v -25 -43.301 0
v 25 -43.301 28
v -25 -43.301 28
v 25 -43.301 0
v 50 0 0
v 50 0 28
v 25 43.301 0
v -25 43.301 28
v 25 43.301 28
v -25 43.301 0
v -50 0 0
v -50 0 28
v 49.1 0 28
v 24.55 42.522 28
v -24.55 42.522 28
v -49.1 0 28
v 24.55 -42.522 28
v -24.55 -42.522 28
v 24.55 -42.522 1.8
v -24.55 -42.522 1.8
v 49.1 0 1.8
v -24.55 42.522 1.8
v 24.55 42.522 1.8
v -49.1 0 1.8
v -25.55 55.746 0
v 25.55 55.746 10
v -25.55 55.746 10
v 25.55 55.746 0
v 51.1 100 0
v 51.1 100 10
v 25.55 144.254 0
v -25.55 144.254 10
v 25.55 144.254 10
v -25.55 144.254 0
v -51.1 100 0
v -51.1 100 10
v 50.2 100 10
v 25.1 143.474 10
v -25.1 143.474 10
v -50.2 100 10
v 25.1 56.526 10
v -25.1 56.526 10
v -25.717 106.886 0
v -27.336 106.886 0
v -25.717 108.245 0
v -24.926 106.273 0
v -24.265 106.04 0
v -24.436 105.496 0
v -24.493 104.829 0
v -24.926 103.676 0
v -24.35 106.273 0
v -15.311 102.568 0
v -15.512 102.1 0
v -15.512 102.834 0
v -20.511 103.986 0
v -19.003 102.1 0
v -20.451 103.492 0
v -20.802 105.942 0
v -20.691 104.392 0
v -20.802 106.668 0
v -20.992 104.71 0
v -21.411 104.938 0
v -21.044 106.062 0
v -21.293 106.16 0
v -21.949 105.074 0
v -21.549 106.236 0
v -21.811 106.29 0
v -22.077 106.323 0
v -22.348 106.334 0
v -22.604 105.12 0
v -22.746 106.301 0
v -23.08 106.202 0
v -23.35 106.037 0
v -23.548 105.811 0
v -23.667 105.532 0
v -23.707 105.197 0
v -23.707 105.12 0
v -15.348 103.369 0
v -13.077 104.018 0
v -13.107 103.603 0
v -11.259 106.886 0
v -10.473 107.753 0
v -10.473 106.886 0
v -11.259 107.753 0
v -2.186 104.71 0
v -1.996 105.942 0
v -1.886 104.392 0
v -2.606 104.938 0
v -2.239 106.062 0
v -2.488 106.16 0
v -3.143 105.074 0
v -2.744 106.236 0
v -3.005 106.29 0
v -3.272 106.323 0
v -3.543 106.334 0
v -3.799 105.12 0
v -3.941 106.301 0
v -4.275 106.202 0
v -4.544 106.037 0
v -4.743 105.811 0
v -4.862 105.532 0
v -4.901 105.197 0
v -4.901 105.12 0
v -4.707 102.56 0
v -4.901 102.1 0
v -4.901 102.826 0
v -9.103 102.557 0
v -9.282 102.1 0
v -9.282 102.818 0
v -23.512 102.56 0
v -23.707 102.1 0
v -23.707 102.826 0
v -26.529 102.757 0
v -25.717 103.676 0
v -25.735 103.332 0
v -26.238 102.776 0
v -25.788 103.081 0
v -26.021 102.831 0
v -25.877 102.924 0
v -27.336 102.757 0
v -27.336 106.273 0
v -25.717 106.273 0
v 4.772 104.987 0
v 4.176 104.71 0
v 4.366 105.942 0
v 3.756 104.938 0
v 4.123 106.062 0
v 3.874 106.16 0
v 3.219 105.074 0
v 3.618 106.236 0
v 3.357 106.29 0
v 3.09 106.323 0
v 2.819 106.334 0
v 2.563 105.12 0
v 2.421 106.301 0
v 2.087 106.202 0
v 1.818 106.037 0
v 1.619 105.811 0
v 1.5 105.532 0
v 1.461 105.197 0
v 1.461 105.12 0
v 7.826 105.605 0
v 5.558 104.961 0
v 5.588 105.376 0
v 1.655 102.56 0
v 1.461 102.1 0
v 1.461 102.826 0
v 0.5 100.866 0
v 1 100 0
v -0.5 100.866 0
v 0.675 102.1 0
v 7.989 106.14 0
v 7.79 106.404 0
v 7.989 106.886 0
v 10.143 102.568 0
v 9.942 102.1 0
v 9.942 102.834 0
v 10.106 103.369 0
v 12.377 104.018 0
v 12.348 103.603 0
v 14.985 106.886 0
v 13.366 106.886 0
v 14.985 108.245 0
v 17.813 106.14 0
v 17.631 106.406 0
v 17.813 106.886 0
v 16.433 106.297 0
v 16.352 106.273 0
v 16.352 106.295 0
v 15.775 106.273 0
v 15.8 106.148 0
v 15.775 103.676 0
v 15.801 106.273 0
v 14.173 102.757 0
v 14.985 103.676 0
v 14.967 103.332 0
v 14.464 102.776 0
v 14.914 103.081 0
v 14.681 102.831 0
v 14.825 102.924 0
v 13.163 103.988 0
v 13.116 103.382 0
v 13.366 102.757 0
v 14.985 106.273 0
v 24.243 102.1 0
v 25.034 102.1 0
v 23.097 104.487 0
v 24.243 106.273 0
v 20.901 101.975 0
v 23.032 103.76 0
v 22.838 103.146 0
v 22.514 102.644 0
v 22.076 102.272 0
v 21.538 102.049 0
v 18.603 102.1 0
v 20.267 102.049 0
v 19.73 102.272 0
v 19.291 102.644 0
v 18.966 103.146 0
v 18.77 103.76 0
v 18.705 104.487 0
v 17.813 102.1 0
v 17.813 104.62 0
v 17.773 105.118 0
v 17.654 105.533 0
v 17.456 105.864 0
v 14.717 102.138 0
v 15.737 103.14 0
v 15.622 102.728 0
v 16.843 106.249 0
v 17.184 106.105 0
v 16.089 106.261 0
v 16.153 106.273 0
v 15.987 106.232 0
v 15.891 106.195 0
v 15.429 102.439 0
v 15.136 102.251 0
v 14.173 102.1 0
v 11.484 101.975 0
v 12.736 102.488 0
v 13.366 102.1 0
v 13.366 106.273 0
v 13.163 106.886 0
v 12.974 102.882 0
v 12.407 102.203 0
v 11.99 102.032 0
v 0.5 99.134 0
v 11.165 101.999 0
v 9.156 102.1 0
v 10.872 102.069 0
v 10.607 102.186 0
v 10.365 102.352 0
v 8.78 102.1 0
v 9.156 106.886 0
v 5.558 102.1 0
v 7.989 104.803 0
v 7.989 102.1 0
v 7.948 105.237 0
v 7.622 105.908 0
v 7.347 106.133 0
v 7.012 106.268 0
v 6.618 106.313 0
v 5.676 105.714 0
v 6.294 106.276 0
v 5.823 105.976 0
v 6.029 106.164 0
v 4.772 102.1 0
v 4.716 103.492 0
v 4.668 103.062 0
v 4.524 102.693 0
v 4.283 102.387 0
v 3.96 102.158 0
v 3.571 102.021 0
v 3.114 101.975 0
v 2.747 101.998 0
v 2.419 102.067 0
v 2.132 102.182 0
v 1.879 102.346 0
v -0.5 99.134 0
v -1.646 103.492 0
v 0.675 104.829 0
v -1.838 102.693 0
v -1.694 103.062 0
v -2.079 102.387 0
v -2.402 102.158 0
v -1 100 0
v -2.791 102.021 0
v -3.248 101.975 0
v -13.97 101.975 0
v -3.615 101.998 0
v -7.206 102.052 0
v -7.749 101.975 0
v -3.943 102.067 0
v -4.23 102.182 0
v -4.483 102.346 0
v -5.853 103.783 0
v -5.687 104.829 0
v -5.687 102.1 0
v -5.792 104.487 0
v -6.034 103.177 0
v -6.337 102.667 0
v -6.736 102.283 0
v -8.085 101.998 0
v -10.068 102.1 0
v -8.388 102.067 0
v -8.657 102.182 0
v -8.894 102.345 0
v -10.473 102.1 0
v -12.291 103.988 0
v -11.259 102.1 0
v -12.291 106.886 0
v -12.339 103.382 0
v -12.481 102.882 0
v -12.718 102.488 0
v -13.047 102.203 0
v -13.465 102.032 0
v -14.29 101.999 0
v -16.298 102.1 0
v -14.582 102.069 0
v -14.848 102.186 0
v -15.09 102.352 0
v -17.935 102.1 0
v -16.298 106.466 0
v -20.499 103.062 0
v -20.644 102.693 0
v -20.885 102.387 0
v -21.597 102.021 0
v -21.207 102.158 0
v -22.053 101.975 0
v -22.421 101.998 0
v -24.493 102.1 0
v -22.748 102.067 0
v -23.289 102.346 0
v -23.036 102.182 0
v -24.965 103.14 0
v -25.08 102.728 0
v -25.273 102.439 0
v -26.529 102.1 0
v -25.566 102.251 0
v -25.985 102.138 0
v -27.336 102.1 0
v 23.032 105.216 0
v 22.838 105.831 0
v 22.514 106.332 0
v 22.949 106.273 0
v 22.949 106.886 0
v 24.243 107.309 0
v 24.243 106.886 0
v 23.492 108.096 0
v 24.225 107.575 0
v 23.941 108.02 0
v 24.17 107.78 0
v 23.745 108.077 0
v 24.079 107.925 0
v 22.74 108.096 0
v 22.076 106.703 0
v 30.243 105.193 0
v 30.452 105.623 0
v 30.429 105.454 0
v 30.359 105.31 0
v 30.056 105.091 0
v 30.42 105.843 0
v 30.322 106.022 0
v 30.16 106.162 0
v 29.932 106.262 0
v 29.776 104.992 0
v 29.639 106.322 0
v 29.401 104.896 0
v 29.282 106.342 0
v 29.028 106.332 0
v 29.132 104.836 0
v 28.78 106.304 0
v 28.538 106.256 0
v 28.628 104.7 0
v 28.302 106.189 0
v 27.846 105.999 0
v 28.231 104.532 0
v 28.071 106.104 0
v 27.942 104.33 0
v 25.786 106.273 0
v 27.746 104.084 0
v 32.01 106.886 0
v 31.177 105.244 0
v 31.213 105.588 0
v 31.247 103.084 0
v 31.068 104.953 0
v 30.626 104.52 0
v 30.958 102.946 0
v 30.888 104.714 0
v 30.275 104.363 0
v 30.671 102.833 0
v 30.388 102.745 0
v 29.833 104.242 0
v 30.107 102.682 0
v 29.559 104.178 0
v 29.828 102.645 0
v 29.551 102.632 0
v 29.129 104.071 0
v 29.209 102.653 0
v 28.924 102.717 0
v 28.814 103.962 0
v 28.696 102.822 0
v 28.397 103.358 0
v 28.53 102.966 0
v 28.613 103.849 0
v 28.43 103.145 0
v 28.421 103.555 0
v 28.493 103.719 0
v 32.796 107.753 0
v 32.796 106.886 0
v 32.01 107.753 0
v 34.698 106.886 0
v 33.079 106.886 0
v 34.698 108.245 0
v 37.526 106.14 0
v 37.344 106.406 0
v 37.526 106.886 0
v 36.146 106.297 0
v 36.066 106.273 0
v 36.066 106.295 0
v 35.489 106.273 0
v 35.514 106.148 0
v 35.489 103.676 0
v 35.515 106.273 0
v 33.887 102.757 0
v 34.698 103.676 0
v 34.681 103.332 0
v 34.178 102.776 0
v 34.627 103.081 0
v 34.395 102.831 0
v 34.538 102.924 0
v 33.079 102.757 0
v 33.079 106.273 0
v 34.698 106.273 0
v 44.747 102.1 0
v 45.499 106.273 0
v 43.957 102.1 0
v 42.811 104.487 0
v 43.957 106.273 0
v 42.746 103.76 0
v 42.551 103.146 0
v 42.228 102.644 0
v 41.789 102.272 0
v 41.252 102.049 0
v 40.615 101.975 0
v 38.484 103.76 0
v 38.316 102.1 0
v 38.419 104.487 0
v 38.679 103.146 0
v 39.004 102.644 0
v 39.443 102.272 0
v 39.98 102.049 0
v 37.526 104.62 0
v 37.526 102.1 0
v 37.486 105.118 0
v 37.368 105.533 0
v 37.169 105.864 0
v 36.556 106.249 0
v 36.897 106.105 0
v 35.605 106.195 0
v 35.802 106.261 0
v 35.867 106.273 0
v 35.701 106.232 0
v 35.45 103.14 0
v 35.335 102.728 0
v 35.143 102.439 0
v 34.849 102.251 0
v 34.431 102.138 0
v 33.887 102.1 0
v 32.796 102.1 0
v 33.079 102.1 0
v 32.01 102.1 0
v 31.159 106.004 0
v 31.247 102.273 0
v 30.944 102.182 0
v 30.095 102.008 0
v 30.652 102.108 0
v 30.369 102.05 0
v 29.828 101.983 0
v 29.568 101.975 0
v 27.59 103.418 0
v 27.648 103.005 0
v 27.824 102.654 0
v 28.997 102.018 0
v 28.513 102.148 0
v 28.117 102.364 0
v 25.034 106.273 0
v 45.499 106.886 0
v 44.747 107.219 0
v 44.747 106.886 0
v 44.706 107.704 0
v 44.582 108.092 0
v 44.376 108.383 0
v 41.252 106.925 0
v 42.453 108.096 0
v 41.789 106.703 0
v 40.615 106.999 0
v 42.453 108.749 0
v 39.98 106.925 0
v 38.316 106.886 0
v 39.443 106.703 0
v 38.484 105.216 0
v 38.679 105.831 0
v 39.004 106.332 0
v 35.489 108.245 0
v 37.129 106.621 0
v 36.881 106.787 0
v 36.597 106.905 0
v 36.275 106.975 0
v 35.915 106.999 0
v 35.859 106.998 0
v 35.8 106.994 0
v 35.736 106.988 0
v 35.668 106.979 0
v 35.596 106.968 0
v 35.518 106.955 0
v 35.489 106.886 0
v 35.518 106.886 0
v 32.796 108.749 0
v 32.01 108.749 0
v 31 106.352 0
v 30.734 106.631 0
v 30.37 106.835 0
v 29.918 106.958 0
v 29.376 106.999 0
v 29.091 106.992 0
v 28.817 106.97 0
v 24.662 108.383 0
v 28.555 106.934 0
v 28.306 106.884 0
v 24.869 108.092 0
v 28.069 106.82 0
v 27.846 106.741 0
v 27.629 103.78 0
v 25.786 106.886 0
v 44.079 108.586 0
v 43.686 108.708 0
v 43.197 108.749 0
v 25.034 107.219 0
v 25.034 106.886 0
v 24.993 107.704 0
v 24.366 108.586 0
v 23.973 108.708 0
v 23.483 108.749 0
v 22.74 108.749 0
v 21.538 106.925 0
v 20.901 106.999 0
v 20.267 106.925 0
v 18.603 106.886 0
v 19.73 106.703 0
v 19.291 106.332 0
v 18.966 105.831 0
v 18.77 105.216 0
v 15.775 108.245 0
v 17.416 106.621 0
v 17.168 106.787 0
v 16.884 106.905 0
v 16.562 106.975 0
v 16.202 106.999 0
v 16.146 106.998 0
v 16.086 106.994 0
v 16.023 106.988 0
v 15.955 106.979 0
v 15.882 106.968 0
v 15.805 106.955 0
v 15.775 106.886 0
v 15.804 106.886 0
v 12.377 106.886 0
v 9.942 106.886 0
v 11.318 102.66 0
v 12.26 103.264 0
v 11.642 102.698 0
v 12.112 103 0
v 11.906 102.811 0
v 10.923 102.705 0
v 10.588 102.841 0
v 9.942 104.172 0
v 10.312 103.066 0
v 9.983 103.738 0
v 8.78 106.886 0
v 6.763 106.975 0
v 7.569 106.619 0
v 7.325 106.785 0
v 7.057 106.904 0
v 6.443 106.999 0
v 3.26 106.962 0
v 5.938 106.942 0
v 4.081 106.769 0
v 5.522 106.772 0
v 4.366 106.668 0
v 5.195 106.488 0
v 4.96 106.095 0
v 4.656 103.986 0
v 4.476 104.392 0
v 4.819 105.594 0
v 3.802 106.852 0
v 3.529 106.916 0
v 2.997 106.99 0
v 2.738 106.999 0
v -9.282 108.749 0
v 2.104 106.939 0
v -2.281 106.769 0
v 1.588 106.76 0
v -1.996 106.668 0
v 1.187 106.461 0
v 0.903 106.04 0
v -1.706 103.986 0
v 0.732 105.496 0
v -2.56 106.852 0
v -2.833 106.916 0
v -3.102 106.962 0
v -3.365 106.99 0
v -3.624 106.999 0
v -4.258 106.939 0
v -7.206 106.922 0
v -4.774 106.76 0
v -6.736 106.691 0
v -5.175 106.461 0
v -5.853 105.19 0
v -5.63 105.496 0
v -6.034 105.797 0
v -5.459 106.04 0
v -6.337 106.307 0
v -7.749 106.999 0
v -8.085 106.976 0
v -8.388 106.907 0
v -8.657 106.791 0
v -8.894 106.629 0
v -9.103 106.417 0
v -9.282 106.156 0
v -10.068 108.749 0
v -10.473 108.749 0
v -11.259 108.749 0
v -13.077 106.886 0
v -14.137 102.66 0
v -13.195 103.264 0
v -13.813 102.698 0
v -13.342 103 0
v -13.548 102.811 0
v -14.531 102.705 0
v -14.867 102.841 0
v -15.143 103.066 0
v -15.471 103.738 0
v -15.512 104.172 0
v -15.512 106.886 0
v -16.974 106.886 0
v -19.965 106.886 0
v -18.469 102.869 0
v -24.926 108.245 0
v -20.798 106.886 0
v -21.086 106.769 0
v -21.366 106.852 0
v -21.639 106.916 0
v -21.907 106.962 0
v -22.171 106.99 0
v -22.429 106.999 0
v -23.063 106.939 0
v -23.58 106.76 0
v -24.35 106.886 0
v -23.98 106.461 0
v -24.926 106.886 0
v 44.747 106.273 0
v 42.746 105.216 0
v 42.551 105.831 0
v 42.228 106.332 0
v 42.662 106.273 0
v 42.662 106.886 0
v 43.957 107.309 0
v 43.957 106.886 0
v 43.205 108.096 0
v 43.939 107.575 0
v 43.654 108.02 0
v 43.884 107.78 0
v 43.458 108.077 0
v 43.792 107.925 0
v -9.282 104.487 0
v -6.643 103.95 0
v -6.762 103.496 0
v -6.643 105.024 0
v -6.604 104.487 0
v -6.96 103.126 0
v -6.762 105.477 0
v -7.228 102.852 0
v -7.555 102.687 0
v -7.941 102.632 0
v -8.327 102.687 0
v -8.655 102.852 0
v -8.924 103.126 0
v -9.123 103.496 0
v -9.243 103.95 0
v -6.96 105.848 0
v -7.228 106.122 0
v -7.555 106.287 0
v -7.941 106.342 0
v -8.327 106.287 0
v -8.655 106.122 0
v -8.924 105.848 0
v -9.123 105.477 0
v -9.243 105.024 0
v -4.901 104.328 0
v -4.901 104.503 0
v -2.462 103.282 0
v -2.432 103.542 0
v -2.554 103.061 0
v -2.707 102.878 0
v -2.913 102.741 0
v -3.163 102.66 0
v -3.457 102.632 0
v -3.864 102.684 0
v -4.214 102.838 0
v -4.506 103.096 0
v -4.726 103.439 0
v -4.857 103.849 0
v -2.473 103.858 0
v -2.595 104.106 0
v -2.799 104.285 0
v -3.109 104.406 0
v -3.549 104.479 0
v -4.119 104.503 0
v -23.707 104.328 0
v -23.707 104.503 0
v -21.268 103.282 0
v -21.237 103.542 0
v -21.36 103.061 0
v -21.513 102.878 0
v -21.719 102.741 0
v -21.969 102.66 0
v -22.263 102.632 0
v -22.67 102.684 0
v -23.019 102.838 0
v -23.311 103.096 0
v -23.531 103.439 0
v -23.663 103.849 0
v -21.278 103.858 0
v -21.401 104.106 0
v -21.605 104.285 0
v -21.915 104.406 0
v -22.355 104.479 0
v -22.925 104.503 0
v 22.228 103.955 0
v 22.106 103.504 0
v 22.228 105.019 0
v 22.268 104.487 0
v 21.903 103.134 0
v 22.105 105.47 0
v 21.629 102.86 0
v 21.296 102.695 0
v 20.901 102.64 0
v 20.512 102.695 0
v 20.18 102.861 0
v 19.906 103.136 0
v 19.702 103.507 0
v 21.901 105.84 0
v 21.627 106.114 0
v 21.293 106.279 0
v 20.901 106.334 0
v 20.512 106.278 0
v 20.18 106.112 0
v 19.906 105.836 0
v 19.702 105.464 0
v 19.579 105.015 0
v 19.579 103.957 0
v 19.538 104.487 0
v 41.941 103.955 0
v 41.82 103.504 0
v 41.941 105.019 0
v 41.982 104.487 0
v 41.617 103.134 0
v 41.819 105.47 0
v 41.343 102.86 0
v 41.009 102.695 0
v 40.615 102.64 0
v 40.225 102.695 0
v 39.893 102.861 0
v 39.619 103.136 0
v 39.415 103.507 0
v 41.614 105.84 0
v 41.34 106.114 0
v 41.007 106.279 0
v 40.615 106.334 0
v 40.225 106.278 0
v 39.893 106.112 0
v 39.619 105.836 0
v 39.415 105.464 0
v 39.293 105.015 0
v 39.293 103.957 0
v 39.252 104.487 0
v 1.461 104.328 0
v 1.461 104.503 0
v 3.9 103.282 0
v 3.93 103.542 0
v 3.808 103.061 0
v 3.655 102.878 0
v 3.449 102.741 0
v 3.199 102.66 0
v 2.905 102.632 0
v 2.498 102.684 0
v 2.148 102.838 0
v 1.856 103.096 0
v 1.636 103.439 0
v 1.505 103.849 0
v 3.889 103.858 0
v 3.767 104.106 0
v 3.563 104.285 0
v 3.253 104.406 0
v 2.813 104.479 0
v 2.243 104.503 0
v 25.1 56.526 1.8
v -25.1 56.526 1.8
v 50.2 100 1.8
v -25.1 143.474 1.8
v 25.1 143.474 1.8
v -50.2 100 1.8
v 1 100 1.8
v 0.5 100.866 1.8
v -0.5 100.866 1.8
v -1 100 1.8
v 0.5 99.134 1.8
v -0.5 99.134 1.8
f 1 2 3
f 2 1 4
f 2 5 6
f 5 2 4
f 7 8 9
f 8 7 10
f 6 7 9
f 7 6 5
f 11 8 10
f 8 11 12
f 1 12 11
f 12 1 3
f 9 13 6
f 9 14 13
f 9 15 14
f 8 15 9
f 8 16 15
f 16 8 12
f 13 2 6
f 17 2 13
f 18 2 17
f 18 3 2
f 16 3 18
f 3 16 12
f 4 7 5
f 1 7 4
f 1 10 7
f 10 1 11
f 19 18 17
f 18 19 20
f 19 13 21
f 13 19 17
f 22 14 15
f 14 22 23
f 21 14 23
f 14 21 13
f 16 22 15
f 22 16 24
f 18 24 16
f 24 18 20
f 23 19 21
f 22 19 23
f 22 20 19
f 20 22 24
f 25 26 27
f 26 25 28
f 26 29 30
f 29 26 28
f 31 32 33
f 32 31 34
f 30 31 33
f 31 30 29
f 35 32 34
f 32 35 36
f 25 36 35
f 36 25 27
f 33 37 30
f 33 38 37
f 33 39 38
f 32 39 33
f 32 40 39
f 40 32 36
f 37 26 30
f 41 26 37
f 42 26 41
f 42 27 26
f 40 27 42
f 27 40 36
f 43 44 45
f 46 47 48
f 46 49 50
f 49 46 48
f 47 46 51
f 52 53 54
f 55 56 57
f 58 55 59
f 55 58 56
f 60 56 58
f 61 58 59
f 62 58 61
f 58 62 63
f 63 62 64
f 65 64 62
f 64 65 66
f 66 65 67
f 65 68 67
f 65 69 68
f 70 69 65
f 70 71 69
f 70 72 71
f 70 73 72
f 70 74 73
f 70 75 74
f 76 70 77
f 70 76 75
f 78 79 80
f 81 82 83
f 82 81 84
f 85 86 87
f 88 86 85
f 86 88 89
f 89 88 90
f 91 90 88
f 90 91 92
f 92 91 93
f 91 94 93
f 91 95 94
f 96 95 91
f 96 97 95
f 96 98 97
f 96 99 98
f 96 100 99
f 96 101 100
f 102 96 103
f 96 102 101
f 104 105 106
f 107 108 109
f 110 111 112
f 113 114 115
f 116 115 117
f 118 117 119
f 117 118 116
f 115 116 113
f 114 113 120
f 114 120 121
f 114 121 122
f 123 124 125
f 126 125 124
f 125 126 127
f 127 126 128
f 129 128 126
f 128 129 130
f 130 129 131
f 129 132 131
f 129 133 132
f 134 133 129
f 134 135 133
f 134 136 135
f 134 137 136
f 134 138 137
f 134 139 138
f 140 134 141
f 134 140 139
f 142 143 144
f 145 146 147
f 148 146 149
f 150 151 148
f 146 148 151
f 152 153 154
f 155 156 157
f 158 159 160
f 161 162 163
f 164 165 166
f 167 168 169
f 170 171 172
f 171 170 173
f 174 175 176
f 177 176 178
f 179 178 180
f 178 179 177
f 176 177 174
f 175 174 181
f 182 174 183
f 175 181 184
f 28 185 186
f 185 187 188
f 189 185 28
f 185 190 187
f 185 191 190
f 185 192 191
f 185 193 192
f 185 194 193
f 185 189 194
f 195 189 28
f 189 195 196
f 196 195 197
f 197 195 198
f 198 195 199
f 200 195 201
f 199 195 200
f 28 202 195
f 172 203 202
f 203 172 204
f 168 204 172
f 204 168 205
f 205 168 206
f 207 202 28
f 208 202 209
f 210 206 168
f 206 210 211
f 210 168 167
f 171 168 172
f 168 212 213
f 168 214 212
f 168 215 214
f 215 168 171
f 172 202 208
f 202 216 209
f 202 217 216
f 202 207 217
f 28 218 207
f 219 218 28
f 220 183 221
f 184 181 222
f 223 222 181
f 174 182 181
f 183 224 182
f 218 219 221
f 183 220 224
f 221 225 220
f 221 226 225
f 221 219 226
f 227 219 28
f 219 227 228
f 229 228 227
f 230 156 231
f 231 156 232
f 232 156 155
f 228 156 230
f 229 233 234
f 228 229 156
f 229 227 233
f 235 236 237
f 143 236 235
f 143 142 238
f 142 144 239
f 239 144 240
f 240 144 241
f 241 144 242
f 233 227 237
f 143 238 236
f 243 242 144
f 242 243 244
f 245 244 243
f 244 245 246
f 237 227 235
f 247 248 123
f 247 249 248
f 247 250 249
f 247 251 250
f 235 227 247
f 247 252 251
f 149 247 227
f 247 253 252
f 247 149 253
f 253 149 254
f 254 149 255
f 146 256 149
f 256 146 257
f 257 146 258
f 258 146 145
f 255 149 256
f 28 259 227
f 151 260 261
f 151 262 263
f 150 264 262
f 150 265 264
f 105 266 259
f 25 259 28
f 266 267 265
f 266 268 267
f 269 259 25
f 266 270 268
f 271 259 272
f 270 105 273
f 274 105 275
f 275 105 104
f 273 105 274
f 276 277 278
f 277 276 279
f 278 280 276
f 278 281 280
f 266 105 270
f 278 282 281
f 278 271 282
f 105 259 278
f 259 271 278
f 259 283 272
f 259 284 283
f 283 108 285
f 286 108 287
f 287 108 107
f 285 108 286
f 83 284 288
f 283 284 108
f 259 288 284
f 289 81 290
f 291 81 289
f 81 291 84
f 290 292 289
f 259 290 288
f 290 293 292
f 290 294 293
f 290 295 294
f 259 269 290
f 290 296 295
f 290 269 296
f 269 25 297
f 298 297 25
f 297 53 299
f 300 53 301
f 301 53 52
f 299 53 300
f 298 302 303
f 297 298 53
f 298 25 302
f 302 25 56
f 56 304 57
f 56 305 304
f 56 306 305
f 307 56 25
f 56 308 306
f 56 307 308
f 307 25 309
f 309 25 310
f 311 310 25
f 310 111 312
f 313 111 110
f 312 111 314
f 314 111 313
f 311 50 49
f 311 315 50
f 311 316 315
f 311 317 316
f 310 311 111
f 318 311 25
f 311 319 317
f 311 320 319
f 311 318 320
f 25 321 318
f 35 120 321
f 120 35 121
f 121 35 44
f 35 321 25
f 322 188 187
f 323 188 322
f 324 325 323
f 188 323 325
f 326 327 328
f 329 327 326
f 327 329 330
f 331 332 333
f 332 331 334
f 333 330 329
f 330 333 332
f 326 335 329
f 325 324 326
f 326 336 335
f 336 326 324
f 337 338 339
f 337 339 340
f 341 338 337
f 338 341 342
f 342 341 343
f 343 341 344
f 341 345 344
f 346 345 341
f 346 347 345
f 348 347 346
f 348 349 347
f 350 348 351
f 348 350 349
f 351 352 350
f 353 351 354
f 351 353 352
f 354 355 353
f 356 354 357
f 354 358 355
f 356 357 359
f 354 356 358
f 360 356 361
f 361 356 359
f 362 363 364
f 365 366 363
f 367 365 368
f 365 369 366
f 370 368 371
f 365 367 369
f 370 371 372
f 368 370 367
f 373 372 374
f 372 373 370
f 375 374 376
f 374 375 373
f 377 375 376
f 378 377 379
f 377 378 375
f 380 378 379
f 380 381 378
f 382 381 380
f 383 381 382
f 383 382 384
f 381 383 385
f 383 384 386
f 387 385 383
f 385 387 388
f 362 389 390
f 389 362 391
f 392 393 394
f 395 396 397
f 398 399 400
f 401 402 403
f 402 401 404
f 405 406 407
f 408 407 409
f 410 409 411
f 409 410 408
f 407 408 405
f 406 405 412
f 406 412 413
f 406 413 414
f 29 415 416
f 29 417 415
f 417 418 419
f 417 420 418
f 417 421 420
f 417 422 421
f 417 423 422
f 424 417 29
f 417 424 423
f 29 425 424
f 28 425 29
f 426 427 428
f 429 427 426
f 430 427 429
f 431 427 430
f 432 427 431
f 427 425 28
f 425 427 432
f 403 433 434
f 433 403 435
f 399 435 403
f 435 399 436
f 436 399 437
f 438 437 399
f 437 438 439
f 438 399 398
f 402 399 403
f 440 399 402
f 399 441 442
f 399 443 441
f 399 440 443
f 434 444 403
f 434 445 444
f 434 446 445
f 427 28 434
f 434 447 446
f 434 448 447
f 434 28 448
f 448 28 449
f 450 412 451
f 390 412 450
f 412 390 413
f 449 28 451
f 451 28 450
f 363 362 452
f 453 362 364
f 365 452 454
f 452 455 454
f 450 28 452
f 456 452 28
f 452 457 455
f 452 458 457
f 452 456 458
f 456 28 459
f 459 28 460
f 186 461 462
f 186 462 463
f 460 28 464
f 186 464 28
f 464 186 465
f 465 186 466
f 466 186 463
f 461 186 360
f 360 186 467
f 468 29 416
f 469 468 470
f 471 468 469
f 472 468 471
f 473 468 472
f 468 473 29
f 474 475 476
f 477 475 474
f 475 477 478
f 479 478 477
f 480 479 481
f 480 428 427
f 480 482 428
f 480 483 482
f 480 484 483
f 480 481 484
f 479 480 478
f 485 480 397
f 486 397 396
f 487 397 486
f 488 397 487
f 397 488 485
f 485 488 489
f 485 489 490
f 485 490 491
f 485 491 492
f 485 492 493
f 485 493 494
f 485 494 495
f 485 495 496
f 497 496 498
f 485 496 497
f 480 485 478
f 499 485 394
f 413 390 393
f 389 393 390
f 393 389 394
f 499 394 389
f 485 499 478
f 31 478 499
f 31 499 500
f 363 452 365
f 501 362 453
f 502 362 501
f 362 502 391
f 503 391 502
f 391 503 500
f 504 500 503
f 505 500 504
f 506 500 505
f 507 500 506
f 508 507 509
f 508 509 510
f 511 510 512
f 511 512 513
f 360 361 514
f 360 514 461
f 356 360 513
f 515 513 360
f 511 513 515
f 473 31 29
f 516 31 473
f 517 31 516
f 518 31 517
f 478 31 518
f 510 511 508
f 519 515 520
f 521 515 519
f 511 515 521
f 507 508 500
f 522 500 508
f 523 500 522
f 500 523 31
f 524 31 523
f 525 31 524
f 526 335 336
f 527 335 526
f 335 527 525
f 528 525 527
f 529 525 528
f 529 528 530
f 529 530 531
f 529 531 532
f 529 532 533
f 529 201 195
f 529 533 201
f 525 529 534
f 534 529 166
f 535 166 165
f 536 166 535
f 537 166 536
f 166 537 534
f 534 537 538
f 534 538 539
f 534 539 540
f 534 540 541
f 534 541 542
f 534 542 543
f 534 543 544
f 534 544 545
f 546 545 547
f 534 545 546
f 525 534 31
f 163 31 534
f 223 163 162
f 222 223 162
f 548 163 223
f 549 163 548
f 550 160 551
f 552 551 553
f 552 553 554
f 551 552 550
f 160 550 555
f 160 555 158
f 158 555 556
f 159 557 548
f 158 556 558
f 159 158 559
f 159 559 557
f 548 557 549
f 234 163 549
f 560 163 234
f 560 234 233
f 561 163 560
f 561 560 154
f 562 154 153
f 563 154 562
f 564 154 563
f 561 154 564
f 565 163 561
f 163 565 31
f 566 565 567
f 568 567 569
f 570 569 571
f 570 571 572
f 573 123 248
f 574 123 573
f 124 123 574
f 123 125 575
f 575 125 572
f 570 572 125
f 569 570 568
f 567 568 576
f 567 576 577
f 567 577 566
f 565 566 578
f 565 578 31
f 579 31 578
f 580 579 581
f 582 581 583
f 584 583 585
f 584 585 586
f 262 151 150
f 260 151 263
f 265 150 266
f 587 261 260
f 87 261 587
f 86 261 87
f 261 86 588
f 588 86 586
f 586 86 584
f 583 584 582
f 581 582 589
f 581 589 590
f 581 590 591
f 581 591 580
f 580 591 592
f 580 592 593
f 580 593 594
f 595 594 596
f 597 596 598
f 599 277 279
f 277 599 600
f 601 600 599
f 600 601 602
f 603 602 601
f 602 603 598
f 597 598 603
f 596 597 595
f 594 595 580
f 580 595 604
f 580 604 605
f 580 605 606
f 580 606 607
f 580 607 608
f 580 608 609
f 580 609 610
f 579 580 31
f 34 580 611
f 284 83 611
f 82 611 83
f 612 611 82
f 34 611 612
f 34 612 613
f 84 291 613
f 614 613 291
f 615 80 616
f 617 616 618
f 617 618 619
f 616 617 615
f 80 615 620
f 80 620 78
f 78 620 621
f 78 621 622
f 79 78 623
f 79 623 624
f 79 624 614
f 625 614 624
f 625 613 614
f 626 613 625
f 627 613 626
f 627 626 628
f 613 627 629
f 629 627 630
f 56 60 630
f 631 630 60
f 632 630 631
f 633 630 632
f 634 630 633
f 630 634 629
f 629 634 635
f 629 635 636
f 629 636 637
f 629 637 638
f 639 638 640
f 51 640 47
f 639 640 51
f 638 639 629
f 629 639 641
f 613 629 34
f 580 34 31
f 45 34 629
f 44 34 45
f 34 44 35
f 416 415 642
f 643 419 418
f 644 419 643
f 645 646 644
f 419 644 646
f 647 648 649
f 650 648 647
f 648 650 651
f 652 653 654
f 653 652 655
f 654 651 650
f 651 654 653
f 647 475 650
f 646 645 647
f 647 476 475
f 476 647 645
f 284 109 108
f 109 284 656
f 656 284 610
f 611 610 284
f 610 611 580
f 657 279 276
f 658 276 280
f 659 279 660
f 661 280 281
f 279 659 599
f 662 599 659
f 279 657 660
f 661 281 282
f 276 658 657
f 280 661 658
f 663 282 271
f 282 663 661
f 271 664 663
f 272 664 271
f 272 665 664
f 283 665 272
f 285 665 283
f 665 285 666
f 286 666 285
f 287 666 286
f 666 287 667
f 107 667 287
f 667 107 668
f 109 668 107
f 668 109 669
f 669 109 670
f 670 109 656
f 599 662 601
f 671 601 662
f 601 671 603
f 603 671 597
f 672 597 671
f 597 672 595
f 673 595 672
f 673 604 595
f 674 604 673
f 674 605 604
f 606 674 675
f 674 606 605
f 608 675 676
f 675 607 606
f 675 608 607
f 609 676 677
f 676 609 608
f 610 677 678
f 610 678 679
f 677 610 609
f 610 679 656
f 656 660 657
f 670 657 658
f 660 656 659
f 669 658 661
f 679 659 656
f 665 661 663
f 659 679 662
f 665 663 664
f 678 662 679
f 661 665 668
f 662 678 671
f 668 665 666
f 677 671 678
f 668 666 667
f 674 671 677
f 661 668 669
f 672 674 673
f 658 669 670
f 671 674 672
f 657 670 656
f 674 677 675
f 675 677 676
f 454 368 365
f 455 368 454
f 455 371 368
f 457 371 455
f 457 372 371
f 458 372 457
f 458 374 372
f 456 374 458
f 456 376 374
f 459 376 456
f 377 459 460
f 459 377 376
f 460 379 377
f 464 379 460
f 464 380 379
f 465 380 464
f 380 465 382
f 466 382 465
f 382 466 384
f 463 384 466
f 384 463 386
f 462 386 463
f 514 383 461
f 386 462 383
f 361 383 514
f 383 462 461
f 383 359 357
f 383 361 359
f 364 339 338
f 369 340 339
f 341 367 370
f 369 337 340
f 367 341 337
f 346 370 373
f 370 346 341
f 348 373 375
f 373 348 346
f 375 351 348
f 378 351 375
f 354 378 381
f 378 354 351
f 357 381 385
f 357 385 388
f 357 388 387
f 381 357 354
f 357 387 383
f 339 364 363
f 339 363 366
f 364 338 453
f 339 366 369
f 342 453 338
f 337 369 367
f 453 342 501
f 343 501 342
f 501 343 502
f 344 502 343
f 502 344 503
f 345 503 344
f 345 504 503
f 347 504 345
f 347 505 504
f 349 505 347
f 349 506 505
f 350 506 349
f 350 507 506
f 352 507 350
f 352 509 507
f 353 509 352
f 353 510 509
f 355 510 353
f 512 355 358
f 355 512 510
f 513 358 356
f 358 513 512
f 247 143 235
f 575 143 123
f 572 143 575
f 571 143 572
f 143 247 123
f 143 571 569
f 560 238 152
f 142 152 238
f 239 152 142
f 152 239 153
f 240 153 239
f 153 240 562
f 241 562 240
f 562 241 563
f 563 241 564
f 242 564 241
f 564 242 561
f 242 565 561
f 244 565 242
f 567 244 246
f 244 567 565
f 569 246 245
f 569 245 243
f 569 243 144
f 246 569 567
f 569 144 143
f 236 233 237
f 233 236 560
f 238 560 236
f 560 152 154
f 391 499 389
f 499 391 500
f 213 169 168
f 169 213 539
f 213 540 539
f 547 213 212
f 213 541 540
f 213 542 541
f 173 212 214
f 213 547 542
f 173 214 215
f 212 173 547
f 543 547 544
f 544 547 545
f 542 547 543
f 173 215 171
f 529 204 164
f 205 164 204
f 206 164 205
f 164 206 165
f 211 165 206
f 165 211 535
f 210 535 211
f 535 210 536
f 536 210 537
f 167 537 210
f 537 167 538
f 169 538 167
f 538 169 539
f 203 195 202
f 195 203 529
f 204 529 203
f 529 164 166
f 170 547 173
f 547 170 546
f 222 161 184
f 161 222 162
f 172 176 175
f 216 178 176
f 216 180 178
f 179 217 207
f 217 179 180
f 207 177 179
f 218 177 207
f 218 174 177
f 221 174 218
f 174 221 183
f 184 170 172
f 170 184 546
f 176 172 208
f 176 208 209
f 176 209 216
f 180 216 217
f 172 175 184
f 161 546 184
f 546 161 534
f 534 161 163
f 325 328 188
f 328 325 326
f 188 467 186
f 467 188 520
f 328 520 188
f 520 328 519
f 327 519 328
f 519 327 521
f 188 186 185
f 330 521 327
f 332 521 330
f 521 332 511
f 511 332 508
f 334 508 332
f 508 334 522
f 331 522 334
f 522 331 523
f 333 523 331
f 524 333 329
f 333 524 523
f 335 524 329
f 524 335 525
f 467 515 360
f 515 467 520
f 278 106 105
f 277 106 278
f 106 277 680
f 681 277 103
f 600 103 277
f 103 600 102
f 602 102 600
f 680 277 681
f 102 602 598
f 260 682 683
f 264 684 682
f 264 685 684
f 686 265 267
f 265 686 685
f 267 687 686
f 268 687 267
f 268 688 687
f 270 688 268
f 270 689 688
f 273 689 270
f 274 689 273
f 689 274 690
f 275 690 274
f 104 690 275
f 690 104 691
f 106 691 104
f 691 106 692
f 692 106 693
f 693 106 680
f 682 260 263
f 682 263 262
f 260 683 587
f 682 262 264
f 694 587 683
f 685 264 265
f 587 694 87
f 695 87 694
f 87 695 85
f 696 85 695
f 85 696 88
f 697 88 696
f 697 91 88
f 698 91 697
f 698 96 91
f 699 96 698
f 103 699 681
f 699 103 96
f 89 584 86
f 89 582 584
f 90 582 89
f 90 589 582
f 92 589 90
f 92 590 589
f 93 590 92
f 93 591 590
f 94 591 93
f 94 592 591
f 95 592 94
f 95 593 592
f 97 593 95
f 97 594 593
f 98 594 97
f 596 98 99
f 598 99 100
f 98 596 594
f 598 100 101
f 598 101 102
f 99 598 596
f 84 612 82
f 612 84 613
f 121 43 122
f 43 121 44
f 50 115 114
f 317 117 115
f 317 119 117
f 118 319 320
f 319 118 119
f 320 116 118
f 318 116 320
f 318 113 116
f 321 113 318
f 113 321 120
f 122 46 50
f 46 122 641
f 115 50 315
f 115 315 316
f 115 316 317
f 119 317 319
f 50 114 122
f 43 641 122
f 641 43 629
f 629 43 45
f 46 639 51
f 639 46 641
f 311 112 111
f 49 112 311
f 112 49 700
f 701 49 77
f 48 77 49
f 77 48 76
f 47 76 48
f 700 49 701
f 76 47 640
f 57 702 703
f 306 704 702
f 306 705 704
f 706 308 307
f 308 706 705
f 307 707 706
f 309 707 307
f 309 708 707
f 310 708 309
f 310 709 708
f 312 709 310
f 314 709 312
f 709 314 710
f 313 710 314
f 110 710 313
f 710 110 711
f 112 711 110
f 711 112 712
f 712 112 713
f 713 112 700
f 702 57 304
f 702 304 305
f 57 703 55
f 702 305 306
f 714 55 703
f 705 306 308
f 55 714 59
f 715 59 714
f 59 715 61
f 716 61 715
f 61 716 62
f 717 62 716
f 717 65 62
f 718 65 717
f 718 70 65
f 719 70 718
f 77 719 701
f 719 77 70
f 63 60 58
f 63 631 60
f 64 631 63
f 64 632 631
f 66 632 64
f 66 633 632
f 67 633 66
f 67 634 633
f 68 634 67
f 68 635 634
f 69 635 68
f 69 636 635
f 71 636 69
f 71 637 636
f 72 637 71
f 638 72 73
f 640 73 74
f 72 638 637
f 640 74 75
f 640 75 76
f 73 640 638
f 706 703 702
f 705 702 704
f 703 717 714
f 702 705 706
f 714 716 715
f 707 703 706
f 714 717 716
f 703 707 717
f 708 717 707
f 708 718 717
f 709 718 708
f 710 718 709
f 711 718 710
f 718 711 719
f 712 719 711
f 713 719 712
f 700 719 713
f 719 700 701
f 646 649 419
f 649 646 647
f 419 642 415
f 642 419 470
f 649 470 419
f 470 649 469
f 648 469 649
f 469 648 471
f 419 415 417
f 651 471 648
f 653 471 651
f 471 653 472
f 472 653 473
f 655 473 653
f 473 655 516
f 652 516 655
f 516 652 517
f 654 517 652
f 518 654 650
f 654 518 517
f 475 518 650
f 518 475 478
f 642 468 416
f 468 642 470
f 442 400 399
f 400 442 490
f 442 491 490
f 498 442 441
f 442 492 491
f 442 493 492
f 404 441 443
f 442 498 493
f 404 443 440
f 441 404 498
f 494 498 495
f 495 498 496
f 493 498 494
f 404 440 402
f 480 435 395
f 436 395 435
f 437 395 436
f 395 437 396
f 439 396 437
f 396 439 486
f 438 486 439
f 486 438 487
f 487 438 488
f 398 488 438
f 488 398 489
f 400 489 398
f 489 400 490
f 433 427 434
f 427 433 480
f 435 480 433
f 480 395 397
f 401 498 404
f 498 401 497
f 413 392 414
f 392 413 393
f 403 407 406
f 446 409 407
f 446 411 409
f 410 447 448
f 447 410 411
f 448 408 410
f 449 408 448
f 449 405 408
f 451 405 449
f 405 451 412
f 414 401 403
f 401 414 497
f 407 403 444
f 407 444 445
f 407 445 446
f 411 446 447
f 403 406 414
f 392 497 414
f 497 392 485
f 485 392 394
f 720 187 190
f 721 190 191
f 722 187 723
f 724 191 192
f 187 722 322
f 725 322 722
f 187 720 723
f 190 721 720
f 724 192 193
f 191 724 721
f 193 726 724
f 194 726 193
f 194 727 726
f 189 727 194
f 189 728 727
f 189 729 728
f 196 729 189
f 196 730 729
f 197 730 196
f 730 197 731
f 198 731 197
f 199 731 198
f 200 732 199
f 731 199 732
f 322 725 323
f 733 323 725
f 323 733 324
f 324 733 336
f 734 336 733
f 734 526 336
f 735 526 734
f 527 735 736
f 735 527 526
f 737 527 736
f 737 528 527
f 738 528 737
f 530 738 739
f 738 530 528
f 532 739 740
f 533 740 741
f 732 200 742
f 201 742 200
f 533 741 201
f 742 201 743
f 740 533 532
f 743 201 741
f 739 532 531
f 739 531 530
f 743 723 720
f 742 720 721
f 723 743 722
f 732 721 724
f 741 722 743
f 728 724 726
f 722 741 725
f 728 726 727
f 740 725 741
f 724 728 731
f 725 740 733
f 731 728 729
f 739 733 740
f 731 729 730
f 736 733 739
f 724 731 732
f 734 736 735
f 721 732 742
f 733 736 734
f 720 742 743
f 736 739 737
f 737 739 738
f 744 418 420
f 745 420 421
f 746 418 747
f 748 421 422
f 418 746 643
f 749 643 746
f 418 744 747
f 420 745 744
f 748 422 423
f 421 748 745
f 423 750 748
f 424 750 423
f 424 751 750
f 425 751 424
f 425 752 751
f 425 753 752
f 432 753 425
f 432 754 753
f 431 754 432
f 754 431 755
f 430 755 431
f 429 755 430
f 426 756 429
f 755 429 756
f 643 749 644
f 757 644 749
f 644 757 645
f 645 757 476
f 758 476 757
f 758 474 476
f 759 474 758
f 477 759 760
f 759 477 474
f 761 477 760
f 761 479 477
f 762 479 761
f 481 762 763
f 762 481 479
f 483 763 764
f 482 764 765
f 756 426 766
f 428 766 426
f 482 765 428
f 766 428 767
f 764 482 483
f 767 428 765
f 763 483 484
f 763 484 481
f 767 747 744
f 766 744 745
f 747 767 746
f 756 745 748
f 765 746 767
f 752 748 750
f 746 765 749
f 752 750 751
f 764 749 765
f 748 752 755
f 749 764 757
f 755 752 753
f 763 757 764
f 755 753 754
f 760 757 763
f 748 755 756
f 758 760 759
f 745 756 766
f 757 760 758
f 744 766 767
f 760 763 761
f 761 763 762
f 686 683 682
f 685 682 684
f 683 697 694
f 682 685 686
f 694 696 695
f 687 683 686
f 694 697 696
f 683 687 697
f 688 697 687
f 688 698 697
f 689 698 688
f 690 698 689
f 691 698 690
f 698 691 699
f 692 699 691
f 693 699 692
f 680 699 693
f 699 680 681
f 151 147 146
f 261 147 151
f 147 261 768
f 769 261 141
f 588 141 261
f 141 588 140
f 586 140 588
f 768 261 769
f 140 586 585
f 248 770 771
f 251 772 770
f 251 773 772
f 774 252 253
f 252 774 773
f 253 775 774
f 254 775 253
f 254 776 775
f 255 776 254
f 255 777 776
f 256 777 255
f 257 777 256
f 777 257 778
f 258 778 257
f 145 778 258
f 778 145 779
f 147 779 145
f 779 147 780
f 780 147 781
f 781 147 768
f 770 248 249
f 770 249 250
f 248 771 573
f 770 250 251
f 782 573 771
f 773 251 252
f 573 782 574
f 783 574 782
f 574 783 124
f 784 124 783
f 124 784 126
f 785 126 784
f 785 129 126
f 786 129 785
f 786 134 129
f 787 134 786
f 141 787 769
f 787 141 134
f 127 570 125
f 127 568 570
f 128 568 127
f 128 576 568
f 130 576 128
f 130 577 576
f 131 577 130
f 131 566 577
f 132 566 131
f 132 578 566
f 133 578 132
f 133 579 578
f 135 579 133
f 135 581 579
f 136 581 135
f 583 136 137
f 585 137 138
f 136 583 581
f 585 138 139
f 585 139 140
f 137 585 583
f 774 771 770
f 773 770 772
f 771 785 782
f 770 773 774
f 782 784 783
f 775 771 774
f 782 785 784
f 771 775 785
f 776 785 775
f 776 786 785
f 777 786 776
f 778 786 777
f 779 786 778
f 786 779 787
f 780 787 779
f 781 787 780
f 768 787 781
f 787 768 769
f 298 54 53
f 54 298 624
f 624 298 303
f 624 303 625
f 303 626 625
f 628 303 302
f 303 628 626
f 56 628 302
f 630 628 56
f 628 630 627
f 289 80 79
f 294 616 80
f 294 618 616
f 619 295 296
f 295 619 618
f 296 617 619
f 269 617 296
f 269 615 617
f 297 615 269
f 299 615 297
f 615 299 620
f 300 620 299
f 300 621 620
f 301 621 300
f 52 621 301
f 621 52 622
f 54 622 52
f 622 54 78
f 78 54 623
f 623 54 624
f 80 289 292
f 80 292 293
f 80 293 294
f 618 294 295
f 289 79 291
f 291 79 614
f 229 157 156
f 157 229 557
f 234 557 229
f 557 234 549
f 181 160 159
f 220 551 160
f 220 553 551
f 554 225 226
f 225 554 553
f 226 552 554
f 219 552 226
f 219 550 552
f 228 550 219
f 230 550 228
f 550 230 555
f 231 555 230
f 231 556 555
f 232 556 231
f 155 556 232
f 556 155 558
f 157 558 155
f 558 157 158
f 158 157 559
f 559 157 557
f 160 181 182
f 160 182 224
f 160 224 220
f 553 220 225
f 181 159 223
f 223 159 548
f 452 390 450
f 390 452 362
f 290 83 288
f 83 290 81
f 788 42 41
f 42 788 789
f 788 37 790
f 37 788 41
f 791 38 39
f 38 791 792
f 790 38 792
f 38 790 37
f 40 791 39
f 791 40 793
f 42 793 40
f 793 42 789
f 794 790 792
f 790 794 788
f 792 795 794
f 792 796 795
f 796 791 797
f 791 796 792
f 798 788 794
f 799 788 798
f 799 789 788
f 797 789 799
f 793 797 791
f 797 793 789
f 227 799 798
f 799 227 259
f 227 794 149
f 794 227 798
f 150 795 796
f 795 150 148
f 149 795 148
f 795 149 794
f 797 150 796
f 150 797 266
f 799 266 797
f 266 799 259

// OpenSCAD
// hexboxes.scad

// unit is mm

lew = 0.2 * 2; // leeway
dia = 100; // hex diameter
thi = 1.8; // thickness
lih = 10; // lid height

//hei = 56; // height, for minis
hei = 28; // height, for dice

bigr = (dia + thi) / 2;
smar = bigr * cos(30);

label = "fortis fortuna adiuvat";
font = "Fira Mono";
font_size = 6.3;
font_spacing = 0.8;
label_dx = 45.7;
label_dy = 2.1;


module hex(height, diameter, hole=false) {

  difference() {

    //cylinder(d=dia + lew + thi, h=height, $fn=6);
    cylinder(d=diameter, h=height, $fn=6);

    translate([ 0, 0, thi ])
      cylinder(d=diameter - thi, h=height, $fn=6);

    if (hole)
      translate([ 0, 0, -0.5 ])
        cylinder(d=2, h=3, $fn=6);
  }
}

// box

translate([ 0, 0, 0 ]) hex(hei, dia);

// lid

difference() {

  translate([ 0, dia, 0 ]) hex(lih, dia + thi + lew, hole=true);

  #translate([ label_dx, dia + label_dy, - thi / 2 ])
    linear_extrude(thi / 2)
      mirror([ 1, 0, 0 ])
        text(label, size=font_size, font=font, spacing=font_spacing);
}
